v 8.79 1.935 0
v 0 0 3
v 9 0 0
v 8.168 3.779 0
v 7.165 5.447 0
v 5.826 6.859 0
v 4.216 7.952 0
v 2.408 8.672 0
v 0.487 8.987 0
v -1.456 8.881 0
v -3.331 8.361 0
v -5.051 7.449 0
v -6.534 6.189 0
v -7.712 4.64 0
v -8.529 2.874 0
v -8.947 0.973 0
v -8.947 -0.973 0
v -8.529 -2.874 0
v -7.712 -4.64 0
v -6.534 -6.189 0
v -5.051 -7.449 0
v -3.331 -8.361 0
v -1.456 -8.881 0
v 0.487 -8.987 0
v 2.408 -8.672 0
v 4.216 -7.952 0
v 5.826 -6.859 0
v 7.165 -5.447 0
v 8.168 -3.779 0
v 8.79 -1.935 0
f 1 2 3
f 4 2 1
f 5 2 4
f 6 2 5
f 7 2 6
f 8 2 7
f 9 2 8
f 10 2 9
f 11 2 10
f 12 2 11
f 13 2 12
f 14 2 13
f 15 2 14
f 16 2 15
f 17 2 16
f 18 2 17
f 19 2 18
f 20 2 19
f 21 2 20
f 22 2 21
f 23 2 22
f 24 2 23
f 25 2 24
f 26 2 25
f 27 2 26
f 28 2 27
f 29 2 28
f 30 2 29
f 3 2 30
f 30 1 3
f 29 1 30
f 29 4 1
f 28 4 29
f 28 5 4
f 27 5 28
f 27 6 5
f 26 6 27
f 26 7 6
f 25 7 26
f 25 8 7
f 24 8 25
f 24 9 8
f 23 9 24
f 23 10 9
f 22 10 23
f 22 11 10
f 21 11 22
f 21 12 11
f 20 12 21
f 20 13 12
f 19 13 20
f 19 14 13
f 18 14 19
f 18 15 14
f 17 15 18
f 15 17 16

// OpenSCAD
// Generated by SolidPython 1.0.1 on 2020-07-29 00:39:25


cylinder(h = 3, r1 = 9, r2 = 0);
/***********************************************
*********      SolidPython code:      **********
************************************************
 
# import packages: SolidPython
from solid import *
from solid.utils import *
from itertools import chain, combinations


class Resize:

    def __init__(self, scad_file):
        self.scad_file = scad_file
        #self.scad_file = import_scad(scad_file)
        # cone/cylinder param:
        self.r1 = 0
        self.r2 = 0
        self.h = 0
        # rectangular prism param:
        self.w = 0
        self.l = 0
        # ellipse param:
        self.r = 0

    # import OpenScad code (file name corresponds to shape)


    # classify shape + parameters
    def assign(self, param1, param2, param3):
        if self.scad_file == 'cone.scad':
            self.r1 = param1
            self.r2 = param2
            self.h = param3
        elif self.scad_file == 'cylinder.scad':
            self.r1 = param1
            self.r2 = param2
            self.h = param3
        elif self.scad_file == 'rectangularPrism.scad':
            self.h = param1
            self.l = param2
            self.w = param3
        else:
            self.r = param1
            self.h = param2

    # resize parameters
    def iterate(self):
        x = range(3, 20, 2)
        i = 1
        if self.scad_file == 'cone.scad':
            tempList = list(combinations(x, 2))
            for temp in tempList:
                param1 = temp[0]
                param2 = temp[1]
                filepath = 'produced_scad_files/' + 'cone' + str(param1) + '_' + str(param2) + '_' + '.scad'
                scad_render_to_file(cylinder(h=param1, r1=param2, r2=0), filepath)

        elif self.scad_file == 'cylinder.scad':
            tempList = list(combinations(x, 3))
            for temp in tempList:
                param1 = temp[0]
                param2 = temp[1]
                filepath = 'produced_scad_files/' + 'cylinder' + str(param1) + '_' + str(param2) + '_' + '.scad'
                scad_render_to_file(cylinder(h=param1, r1=param2, r2=param2), filepath)

        elif self.scad_file == 'rectangularPrism.scad':
            tempList = list(combinations(x, 3))
            for temp in tempList:
                param1 = temp[0]
                param2 = temp[1]
                param3 = temp[2]
                filepath = 'produced_scad_files/' + 'rectangularPrism' + str(param1) + '_' + str(param2) + '_' + str(
                    param3) + '.scad'
                scad_render_to_file(cube(size=(param1, param2, param3)), filepath)

        elif self.scad_file == 'ellipse.scad':
            tempList = list(combinations(x, 4))
            for temp in tempList:
                param1 = temp[0]
                param2 = temp[1]
                param3 = temp[2]
                param4 = temp[3]
                filepath = 'produced_scad_files/' + 'ellipse' + str(param1) + '_' + str(param2) + '_' + str(param3) + '_' + str(param4) + '.scad'
                scad_render_to_file(scale([param1, param2, param3])(sphere(r=param4)), filepath)

    def render_to_scadfile(self):
        scad_render_to_file(scad, 'example.scad') 
 
************************************************/
